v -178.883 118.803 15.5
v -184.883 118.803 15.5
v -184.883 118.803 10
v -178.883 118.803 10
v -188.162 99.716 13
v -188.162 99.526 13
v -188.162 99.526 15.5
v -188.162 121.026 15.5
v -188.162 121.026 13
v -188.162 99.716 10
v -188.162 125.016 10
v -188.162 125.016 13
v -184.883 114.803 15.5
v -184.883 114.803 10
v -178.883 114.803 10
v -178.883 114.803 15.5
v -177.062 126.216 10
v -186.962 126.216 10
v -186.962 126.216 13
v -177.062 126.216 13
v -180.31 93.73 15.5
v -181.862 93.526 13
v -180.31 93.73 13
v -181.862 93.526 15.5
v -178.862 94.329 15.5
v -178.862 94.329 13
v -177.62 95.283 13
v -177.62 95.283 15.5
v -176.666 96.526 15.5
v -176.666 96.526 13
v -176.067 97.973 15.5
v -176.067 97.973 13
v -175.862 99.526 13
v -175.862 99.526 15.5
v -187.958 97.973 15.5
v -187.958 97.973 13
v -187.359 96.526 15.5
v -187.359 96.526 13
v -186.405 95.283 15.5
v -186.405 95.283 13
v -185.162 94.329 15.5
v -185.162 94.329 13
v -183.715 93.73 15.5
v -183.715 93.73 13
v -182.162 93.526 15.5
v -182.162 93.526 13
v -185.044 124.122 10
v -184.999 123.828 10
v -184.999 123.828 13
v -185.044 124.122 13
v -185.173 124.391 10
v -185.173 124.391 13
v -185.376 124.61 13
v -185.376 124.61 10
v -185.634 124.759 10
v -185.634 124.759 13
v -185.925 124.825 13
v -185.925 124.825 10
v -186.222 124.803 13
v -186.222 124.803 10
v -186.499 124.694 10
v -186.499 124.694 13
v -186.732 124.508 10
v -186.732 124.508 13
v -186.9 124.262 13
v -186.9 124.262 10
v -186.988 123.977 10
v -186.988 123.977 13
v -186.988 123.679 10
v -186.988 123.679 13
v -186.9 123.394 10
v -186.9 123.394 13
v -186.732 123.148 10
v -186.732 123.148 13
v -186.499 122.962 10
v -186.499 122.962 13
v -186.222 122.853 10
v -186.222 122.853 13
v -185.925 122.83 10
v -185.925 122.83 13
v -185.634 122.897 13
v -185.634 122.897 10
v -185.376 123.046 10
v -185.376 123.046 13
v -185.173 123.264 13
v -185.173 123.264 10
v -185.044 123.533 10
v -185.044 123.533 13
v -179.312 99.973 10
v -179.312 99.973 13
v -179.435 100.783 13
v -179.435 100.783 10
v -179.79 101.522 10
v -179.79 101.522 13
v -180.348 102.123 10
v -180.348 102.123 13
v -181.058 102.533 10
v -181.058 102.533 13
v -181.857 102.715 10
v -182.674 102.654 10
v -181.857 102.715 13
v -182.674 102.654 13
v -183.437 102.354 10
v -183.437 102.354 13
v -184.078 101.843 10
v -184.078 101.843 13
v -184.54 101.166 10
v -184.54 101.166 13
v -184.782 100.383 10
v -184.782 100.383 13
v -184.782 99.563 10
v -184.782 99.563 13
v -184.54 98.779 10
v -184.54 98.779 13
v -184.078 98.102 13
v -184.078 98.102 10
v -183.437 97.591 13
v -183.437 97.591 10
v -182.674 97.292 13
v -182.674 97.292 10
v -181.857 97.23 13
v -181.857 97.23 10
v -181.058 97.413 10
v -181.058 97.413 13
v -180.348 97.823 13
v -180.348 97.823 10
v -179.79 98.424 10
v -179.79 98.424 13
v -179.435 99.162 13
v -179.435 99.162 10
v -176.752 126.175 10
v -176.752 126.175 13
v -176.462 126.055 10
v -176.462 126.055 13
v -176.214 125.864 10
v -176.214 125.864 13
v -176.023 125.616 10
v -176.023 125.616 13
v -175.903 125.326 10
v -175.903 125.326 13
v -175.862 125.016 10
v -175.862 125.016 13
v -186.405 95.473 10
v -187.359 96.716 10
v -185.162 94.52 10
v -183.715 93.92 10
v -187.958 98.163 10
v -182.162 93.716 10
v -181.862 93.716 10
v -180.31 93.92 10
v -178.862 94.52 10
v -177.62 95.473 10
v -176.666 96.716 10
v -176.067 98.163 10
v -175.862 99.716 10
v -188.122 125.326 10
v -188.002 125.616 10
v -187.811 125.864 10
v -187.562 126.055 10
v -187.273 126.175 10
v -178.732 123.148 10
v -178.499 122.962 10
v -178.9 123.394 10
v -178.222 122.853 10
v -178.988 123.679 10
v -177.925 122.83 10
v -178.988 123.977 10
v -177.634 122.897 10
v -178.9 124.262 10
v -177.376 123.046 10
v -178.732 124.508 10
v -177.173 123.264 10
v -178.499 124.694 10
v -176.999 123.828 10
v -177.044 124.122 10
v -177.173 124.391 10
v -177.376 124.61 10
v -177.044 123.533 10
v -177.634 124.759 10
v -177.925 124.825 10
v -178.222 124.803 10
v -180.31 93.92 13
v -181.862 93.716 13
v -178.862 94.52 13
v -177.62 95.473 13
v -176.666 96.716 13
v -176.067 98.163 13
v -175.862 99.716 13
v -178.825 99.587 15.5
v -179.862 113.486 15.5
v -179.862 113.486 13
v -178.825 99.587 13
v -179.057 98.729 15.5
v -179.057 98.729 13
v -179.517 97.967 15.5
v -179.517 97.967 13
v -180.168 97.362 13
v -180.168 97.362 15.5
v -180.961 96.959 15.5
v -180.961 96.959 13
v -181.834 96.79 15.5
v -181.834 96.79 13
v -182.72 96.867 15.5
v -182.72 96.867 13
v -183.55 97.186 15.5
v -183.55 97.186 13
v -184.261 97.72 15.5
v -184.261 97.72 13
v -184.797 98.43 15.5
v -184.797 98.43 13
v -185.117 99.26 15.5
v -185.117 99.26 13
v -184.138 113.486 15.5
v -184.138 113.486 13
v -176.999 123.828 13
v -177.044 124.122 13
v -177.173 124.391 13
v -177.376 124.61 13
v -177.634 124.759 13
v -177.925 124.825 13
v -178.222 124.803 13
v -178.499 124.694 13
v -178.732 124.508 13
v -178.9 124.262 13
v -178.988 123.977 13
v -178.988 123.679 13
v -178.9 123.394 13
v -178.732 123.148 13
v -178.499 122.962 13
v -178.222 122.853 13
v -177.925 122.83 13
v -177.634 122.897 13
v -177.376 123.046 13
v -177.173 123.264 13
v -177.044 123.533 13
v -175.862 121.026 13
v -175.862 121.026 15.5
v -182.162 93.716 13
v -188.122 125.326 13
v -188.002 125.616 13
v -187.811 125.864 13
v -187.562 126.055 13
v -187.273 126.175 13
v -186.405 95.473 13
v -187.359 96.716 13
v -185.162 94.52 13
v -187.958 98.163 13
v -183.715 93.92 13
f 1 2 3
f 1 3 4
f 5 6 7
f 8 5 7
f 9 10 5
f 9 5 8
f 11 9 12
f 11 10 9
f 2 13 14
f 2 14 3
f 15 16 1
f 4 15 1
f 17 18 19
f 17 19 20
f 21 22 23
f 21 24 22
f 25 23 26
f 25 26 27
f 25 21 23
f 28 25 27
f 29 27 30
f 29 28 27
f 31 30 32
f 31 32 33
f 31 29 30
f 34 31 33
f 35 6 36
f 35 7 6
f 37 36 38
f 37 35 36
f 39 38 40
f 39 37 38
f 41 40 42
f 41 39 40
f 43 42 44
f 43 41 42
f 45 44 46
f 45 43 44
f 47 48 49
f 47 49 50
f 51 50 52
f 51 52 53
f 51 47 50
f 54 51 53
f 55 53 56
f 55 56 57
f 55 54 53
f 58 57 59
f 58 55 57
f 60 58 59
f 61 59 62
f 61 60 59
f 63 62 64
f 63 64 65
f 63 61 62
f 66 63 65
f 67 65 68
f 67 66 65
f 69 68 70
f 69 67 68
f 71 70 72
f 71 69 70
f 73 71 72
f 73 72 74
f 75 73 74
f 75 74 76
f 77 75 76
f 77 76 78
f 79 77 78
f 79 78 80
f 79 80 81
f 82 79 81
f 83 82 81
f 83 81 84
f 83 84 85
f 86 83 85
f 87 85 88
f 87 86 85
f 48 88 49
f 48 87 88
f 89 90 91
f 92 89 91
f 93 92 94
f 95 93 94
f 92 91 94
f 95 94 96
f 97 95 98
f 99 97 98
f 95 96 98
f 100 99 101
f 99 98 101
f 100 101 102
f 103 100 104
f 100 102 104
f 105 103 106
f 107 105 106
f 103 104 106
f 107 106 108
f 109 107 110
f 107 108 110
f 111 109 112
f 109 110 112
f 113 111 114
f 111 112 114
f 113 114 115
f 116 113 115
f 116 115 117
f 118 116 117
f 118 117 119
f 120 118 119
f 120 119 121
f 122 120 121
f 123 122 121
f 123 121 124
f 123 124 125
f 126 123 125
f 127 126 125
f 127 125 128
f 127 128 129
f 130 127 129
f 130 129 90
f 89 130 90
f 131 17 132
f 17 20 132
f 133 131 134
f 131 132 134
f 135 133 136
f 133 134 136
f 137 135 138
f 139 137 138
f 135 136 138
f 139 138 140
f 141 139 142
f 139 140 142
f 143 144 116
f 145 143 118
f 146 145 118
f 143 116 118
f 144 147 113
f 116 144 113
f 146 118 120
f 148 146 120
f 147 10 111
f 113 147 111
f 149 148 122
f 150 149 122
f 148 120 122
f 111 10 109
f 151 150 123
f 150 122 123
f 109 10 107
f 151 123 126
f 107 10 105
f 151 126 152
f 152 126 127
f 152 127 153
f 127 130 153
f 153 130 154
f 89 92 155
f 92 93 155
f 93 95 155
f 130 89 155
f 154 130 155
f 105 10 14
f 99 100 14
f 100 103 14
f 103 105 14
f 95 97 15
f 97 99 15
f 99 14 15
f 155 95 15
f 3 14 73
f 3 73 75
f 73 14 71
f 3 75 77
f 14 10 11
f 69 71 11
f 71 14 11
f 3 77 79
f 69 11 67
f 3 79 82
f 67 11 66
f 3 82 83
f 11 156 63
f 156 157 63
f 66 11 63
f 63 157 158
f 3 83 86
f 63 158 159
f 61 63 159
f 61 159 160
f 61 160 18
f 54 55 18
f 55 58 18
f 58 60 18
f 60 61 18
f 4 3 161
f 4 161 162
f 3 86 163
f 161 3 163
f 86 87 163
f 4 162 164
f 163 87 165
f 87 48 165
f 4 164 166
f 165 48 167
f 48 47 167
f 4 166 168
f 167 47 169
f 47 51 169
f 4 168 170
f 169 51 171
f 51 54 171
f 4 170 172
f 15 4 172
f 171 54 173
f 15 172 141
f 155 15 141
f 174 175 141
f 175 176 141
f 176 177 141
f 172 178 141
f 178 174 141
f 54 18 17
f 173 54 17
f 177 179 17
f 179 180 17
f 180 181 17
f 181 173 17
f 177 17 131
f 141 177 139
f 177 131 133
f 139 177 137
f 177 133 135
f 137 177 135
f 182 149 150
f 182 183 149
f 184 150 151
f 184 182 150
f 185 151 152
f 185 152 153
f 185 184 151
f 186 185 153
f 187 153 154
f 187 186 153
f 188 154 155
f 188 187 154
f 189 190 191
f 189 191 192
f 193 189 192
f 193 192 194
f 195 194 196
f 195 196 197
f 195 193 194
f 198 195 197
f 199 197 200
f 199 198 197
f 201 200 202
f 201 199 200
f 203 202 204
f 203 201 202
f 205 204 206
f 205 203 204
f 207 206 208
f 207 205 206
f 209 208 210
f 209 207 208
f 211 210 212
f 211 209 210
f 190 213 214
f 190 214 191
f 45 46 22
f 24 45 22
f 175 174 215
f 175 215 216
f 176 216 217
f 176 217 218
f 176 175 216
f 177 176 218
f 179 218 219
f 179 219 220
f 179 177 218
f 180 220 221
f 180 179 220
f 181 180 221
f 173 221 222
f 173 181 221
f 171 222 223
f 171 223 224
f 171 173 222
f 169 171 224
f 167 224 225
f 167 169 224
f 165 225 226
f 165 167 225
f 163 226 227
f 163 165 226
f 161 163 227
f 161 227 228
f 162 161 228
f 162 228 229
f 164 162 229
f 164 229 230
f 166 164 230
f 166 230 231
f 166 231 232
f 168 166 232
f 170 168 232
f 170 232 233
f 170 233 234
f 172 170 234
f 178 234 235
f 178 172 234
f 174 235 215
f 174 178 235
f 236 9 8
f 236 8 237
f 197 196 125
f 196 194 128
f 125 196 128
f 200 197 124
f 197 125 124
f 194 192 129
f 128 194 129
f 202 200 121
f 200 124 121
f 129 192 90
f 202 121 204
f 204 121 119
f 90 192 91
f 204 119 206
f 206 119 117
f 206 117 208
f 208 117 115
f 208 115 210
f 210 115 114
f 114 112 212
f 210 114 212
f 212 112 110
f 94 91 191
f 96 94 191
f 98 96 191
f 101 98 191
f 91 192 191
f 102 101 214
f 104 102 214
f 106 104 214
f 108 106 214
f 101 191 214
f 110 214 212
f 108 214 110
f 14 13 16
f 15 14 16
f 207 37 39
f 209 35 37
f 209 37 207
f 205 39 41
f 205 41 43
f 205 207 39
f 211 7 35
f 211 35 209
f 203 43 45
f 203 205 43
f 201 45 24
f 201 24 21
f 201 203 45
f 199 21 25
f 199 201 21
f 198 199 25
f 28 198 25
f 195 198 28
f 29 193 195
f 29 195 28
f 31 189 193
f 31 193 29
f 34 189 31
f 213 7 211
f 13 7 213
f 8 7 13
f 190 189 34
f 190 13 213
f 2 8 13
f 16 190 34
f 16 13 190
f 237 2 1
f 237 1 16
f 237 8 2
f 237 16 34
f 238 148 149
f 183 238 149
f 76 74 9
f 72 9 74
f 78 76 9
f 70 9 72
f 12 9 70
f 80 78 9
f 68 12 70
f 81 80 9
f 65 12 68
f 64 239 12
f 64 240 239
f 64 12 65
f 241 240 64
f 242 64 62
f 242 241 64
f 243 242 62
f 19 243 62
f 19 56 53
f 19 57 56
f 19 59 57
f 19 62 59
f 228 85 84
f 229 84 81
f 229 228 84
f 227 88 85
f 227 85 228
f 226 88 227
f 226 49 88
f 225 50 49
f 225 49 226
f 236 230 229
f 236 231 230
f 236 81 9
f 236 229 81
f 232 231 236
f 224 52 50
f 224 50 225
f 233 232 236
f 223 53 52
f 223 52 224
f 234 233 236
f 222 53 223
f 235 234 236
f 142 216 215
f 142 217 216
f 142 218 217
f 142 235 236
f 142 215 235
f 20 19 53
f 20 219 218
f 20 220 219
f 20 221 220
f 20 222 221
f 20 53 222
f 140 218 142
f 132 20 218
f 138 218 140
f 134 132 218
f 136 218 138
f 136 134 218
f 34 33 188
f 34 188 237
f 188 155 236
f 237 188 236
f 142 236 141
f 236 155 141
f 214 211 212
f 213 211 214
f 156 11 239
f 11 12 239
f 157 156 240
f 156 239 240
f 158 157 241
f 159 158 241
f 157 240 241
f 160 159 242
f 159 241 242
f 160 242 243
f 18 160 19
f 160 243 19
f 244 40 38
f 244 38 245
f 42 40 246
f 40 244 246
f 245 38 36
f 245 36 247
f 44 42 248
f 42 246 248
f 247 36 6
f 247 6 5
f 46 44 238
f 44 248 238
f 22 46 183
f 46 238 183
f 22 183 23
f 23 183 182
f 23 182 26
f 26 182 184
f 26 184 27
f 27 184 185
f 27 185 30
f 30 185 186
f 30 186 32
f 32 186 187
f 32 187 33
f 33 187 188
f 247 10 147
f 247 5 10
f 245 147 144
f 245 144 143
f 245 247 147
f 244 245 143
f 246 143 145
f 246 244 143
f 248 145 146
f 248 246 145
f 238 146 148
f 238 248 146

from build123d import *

# Parameters (mm, degrees)
SKETCH1_W           = 12.3
SKETCH1_H           = 32.5
SKETCH1_R           = 1
BOSS_EXTRUDE1_DEPTH = 3
FILLET1_R           = 1.2
FILLET2_R           = 6
SKETCH2_W           = 12.3
SKETCH2_H           = 27.5
BOSS_EXTRUDE2_DEPTH = 2.5
FILLET3_R           = 6
SKETCH3_W           = 6
SKETCH3_H           = 4
CUT_EXTRUDE1_DEPTH  = 227.640270134
CUT_EXTRUDE2_DEPTH  = 2.5
SKETCH5_R           = 2.75
CUT_EXTRUDE3_DEPTH  = 227.593384825


with BuildPart() as part:
    # Sketch1 → Boss-Extrude1 (new body)
    with BuildSketch(Plane.XY.offset(10)):
        with Locations((-182.01249108, 109.965842893)):
            Rectangle(SKETCH1_W, SKETCH1_H)
        with Locations((-185.999386631, 123.827694148)):
            Circle(SKETCH1_R, mode=Mode.SUBTRACT)
        with Locations((-177.999386631, 123.827694148)):
            Circle(SKETCH1_R, mode=Mode.SUBTRACT)
    extrude(amount=BOSS_EXTRUDE1_DEPTH)

    # Fillet1
    fillet1_edges = [part.edges().sort_by_distance(p)[0] for p in [
        (-188.16249108, 126.215842893, 11.5),
        (-175.86249108, 126.215842893, 11.5),
    ]]
    fillet(fillet1_edges, radius=FILLET1_R)

    # Fillet2
    fillet2_edges = [part.edges().sort_by_distance(p)[0] for p in [
        (-175.86249108, 93.715842893, 11.5),
        (-188.16249108, 93.715842893, 11.5),
    ]]
    fillet(fillet2_edges, radius=FILLET2_R)

    # Sketch2 → Boss-Extrude2 (add)
    with BuildSketch(Plane.XY.offset(13)):
        with Locations((-182.01249108, 107.27562942)):
            Rectangle(SKETCH2_W, SKETCH2_H)
    extrude(amount=BOSS_EXTRUDE2_DEPTH)

    # Fillet3
    fillet3_edges = [part.edges().sort_by_distance(p)[0] for p in [
        (-188.16249108, 93.52562942, 14.25),
        (-175.86249108, 93.52562942, 14.25),
    ]]
    fillet(fillet3_edges, radius=FILLET3_R)

    # Sketch3 → Cut-Extrude1 (cut, through all)
    with BuildSketch(Plane.XY.offset(15.5)):
        with Locations((-181.88348906, 116.80293228)):
            Rectangle(SKETCH3_W, SKETCH3_H)
    extrude(amount=-CUT_EXTRUDE1_DEPTH, mode=Mode.SUBTRACT)

    # Sketch4 → Cut-Extrude2 (cut)
    with BuildSketch(Plane.XY.offset(15.5)):
        with BuildLine():
            Line((-184.138427734, 113.48600769), (-179.861572266, 113.48600769))
            Line((-179.861572266, 113.48600769), (-178.824890137, 99.586959839))
            ThreePointArc((-178.824890137, 99.586959839), (-181.83374979, 96.789675787), (-185.116622925, 99.259651184))
            Line((-185.116622925, 99.259651184), (-184.138427734, 113.48600769))
        make_face()
    extrude(amount=-CUT_EXTRUDE2_DEPTH, mode=Mode.SUBTRACT)

    # Sketch5 → Cut-Extrude3 (cut, through all)
    with BuildSketch(Plane.XY.offset(13)):
        with Locations((-182.06249108, 99.972659898)):
            Circle(SKETCH5_R)
    extrude(amount=-CUT_EXTRUDE3_DEPTH, mode=Mode.SUBTRACT)


solid = part.part
